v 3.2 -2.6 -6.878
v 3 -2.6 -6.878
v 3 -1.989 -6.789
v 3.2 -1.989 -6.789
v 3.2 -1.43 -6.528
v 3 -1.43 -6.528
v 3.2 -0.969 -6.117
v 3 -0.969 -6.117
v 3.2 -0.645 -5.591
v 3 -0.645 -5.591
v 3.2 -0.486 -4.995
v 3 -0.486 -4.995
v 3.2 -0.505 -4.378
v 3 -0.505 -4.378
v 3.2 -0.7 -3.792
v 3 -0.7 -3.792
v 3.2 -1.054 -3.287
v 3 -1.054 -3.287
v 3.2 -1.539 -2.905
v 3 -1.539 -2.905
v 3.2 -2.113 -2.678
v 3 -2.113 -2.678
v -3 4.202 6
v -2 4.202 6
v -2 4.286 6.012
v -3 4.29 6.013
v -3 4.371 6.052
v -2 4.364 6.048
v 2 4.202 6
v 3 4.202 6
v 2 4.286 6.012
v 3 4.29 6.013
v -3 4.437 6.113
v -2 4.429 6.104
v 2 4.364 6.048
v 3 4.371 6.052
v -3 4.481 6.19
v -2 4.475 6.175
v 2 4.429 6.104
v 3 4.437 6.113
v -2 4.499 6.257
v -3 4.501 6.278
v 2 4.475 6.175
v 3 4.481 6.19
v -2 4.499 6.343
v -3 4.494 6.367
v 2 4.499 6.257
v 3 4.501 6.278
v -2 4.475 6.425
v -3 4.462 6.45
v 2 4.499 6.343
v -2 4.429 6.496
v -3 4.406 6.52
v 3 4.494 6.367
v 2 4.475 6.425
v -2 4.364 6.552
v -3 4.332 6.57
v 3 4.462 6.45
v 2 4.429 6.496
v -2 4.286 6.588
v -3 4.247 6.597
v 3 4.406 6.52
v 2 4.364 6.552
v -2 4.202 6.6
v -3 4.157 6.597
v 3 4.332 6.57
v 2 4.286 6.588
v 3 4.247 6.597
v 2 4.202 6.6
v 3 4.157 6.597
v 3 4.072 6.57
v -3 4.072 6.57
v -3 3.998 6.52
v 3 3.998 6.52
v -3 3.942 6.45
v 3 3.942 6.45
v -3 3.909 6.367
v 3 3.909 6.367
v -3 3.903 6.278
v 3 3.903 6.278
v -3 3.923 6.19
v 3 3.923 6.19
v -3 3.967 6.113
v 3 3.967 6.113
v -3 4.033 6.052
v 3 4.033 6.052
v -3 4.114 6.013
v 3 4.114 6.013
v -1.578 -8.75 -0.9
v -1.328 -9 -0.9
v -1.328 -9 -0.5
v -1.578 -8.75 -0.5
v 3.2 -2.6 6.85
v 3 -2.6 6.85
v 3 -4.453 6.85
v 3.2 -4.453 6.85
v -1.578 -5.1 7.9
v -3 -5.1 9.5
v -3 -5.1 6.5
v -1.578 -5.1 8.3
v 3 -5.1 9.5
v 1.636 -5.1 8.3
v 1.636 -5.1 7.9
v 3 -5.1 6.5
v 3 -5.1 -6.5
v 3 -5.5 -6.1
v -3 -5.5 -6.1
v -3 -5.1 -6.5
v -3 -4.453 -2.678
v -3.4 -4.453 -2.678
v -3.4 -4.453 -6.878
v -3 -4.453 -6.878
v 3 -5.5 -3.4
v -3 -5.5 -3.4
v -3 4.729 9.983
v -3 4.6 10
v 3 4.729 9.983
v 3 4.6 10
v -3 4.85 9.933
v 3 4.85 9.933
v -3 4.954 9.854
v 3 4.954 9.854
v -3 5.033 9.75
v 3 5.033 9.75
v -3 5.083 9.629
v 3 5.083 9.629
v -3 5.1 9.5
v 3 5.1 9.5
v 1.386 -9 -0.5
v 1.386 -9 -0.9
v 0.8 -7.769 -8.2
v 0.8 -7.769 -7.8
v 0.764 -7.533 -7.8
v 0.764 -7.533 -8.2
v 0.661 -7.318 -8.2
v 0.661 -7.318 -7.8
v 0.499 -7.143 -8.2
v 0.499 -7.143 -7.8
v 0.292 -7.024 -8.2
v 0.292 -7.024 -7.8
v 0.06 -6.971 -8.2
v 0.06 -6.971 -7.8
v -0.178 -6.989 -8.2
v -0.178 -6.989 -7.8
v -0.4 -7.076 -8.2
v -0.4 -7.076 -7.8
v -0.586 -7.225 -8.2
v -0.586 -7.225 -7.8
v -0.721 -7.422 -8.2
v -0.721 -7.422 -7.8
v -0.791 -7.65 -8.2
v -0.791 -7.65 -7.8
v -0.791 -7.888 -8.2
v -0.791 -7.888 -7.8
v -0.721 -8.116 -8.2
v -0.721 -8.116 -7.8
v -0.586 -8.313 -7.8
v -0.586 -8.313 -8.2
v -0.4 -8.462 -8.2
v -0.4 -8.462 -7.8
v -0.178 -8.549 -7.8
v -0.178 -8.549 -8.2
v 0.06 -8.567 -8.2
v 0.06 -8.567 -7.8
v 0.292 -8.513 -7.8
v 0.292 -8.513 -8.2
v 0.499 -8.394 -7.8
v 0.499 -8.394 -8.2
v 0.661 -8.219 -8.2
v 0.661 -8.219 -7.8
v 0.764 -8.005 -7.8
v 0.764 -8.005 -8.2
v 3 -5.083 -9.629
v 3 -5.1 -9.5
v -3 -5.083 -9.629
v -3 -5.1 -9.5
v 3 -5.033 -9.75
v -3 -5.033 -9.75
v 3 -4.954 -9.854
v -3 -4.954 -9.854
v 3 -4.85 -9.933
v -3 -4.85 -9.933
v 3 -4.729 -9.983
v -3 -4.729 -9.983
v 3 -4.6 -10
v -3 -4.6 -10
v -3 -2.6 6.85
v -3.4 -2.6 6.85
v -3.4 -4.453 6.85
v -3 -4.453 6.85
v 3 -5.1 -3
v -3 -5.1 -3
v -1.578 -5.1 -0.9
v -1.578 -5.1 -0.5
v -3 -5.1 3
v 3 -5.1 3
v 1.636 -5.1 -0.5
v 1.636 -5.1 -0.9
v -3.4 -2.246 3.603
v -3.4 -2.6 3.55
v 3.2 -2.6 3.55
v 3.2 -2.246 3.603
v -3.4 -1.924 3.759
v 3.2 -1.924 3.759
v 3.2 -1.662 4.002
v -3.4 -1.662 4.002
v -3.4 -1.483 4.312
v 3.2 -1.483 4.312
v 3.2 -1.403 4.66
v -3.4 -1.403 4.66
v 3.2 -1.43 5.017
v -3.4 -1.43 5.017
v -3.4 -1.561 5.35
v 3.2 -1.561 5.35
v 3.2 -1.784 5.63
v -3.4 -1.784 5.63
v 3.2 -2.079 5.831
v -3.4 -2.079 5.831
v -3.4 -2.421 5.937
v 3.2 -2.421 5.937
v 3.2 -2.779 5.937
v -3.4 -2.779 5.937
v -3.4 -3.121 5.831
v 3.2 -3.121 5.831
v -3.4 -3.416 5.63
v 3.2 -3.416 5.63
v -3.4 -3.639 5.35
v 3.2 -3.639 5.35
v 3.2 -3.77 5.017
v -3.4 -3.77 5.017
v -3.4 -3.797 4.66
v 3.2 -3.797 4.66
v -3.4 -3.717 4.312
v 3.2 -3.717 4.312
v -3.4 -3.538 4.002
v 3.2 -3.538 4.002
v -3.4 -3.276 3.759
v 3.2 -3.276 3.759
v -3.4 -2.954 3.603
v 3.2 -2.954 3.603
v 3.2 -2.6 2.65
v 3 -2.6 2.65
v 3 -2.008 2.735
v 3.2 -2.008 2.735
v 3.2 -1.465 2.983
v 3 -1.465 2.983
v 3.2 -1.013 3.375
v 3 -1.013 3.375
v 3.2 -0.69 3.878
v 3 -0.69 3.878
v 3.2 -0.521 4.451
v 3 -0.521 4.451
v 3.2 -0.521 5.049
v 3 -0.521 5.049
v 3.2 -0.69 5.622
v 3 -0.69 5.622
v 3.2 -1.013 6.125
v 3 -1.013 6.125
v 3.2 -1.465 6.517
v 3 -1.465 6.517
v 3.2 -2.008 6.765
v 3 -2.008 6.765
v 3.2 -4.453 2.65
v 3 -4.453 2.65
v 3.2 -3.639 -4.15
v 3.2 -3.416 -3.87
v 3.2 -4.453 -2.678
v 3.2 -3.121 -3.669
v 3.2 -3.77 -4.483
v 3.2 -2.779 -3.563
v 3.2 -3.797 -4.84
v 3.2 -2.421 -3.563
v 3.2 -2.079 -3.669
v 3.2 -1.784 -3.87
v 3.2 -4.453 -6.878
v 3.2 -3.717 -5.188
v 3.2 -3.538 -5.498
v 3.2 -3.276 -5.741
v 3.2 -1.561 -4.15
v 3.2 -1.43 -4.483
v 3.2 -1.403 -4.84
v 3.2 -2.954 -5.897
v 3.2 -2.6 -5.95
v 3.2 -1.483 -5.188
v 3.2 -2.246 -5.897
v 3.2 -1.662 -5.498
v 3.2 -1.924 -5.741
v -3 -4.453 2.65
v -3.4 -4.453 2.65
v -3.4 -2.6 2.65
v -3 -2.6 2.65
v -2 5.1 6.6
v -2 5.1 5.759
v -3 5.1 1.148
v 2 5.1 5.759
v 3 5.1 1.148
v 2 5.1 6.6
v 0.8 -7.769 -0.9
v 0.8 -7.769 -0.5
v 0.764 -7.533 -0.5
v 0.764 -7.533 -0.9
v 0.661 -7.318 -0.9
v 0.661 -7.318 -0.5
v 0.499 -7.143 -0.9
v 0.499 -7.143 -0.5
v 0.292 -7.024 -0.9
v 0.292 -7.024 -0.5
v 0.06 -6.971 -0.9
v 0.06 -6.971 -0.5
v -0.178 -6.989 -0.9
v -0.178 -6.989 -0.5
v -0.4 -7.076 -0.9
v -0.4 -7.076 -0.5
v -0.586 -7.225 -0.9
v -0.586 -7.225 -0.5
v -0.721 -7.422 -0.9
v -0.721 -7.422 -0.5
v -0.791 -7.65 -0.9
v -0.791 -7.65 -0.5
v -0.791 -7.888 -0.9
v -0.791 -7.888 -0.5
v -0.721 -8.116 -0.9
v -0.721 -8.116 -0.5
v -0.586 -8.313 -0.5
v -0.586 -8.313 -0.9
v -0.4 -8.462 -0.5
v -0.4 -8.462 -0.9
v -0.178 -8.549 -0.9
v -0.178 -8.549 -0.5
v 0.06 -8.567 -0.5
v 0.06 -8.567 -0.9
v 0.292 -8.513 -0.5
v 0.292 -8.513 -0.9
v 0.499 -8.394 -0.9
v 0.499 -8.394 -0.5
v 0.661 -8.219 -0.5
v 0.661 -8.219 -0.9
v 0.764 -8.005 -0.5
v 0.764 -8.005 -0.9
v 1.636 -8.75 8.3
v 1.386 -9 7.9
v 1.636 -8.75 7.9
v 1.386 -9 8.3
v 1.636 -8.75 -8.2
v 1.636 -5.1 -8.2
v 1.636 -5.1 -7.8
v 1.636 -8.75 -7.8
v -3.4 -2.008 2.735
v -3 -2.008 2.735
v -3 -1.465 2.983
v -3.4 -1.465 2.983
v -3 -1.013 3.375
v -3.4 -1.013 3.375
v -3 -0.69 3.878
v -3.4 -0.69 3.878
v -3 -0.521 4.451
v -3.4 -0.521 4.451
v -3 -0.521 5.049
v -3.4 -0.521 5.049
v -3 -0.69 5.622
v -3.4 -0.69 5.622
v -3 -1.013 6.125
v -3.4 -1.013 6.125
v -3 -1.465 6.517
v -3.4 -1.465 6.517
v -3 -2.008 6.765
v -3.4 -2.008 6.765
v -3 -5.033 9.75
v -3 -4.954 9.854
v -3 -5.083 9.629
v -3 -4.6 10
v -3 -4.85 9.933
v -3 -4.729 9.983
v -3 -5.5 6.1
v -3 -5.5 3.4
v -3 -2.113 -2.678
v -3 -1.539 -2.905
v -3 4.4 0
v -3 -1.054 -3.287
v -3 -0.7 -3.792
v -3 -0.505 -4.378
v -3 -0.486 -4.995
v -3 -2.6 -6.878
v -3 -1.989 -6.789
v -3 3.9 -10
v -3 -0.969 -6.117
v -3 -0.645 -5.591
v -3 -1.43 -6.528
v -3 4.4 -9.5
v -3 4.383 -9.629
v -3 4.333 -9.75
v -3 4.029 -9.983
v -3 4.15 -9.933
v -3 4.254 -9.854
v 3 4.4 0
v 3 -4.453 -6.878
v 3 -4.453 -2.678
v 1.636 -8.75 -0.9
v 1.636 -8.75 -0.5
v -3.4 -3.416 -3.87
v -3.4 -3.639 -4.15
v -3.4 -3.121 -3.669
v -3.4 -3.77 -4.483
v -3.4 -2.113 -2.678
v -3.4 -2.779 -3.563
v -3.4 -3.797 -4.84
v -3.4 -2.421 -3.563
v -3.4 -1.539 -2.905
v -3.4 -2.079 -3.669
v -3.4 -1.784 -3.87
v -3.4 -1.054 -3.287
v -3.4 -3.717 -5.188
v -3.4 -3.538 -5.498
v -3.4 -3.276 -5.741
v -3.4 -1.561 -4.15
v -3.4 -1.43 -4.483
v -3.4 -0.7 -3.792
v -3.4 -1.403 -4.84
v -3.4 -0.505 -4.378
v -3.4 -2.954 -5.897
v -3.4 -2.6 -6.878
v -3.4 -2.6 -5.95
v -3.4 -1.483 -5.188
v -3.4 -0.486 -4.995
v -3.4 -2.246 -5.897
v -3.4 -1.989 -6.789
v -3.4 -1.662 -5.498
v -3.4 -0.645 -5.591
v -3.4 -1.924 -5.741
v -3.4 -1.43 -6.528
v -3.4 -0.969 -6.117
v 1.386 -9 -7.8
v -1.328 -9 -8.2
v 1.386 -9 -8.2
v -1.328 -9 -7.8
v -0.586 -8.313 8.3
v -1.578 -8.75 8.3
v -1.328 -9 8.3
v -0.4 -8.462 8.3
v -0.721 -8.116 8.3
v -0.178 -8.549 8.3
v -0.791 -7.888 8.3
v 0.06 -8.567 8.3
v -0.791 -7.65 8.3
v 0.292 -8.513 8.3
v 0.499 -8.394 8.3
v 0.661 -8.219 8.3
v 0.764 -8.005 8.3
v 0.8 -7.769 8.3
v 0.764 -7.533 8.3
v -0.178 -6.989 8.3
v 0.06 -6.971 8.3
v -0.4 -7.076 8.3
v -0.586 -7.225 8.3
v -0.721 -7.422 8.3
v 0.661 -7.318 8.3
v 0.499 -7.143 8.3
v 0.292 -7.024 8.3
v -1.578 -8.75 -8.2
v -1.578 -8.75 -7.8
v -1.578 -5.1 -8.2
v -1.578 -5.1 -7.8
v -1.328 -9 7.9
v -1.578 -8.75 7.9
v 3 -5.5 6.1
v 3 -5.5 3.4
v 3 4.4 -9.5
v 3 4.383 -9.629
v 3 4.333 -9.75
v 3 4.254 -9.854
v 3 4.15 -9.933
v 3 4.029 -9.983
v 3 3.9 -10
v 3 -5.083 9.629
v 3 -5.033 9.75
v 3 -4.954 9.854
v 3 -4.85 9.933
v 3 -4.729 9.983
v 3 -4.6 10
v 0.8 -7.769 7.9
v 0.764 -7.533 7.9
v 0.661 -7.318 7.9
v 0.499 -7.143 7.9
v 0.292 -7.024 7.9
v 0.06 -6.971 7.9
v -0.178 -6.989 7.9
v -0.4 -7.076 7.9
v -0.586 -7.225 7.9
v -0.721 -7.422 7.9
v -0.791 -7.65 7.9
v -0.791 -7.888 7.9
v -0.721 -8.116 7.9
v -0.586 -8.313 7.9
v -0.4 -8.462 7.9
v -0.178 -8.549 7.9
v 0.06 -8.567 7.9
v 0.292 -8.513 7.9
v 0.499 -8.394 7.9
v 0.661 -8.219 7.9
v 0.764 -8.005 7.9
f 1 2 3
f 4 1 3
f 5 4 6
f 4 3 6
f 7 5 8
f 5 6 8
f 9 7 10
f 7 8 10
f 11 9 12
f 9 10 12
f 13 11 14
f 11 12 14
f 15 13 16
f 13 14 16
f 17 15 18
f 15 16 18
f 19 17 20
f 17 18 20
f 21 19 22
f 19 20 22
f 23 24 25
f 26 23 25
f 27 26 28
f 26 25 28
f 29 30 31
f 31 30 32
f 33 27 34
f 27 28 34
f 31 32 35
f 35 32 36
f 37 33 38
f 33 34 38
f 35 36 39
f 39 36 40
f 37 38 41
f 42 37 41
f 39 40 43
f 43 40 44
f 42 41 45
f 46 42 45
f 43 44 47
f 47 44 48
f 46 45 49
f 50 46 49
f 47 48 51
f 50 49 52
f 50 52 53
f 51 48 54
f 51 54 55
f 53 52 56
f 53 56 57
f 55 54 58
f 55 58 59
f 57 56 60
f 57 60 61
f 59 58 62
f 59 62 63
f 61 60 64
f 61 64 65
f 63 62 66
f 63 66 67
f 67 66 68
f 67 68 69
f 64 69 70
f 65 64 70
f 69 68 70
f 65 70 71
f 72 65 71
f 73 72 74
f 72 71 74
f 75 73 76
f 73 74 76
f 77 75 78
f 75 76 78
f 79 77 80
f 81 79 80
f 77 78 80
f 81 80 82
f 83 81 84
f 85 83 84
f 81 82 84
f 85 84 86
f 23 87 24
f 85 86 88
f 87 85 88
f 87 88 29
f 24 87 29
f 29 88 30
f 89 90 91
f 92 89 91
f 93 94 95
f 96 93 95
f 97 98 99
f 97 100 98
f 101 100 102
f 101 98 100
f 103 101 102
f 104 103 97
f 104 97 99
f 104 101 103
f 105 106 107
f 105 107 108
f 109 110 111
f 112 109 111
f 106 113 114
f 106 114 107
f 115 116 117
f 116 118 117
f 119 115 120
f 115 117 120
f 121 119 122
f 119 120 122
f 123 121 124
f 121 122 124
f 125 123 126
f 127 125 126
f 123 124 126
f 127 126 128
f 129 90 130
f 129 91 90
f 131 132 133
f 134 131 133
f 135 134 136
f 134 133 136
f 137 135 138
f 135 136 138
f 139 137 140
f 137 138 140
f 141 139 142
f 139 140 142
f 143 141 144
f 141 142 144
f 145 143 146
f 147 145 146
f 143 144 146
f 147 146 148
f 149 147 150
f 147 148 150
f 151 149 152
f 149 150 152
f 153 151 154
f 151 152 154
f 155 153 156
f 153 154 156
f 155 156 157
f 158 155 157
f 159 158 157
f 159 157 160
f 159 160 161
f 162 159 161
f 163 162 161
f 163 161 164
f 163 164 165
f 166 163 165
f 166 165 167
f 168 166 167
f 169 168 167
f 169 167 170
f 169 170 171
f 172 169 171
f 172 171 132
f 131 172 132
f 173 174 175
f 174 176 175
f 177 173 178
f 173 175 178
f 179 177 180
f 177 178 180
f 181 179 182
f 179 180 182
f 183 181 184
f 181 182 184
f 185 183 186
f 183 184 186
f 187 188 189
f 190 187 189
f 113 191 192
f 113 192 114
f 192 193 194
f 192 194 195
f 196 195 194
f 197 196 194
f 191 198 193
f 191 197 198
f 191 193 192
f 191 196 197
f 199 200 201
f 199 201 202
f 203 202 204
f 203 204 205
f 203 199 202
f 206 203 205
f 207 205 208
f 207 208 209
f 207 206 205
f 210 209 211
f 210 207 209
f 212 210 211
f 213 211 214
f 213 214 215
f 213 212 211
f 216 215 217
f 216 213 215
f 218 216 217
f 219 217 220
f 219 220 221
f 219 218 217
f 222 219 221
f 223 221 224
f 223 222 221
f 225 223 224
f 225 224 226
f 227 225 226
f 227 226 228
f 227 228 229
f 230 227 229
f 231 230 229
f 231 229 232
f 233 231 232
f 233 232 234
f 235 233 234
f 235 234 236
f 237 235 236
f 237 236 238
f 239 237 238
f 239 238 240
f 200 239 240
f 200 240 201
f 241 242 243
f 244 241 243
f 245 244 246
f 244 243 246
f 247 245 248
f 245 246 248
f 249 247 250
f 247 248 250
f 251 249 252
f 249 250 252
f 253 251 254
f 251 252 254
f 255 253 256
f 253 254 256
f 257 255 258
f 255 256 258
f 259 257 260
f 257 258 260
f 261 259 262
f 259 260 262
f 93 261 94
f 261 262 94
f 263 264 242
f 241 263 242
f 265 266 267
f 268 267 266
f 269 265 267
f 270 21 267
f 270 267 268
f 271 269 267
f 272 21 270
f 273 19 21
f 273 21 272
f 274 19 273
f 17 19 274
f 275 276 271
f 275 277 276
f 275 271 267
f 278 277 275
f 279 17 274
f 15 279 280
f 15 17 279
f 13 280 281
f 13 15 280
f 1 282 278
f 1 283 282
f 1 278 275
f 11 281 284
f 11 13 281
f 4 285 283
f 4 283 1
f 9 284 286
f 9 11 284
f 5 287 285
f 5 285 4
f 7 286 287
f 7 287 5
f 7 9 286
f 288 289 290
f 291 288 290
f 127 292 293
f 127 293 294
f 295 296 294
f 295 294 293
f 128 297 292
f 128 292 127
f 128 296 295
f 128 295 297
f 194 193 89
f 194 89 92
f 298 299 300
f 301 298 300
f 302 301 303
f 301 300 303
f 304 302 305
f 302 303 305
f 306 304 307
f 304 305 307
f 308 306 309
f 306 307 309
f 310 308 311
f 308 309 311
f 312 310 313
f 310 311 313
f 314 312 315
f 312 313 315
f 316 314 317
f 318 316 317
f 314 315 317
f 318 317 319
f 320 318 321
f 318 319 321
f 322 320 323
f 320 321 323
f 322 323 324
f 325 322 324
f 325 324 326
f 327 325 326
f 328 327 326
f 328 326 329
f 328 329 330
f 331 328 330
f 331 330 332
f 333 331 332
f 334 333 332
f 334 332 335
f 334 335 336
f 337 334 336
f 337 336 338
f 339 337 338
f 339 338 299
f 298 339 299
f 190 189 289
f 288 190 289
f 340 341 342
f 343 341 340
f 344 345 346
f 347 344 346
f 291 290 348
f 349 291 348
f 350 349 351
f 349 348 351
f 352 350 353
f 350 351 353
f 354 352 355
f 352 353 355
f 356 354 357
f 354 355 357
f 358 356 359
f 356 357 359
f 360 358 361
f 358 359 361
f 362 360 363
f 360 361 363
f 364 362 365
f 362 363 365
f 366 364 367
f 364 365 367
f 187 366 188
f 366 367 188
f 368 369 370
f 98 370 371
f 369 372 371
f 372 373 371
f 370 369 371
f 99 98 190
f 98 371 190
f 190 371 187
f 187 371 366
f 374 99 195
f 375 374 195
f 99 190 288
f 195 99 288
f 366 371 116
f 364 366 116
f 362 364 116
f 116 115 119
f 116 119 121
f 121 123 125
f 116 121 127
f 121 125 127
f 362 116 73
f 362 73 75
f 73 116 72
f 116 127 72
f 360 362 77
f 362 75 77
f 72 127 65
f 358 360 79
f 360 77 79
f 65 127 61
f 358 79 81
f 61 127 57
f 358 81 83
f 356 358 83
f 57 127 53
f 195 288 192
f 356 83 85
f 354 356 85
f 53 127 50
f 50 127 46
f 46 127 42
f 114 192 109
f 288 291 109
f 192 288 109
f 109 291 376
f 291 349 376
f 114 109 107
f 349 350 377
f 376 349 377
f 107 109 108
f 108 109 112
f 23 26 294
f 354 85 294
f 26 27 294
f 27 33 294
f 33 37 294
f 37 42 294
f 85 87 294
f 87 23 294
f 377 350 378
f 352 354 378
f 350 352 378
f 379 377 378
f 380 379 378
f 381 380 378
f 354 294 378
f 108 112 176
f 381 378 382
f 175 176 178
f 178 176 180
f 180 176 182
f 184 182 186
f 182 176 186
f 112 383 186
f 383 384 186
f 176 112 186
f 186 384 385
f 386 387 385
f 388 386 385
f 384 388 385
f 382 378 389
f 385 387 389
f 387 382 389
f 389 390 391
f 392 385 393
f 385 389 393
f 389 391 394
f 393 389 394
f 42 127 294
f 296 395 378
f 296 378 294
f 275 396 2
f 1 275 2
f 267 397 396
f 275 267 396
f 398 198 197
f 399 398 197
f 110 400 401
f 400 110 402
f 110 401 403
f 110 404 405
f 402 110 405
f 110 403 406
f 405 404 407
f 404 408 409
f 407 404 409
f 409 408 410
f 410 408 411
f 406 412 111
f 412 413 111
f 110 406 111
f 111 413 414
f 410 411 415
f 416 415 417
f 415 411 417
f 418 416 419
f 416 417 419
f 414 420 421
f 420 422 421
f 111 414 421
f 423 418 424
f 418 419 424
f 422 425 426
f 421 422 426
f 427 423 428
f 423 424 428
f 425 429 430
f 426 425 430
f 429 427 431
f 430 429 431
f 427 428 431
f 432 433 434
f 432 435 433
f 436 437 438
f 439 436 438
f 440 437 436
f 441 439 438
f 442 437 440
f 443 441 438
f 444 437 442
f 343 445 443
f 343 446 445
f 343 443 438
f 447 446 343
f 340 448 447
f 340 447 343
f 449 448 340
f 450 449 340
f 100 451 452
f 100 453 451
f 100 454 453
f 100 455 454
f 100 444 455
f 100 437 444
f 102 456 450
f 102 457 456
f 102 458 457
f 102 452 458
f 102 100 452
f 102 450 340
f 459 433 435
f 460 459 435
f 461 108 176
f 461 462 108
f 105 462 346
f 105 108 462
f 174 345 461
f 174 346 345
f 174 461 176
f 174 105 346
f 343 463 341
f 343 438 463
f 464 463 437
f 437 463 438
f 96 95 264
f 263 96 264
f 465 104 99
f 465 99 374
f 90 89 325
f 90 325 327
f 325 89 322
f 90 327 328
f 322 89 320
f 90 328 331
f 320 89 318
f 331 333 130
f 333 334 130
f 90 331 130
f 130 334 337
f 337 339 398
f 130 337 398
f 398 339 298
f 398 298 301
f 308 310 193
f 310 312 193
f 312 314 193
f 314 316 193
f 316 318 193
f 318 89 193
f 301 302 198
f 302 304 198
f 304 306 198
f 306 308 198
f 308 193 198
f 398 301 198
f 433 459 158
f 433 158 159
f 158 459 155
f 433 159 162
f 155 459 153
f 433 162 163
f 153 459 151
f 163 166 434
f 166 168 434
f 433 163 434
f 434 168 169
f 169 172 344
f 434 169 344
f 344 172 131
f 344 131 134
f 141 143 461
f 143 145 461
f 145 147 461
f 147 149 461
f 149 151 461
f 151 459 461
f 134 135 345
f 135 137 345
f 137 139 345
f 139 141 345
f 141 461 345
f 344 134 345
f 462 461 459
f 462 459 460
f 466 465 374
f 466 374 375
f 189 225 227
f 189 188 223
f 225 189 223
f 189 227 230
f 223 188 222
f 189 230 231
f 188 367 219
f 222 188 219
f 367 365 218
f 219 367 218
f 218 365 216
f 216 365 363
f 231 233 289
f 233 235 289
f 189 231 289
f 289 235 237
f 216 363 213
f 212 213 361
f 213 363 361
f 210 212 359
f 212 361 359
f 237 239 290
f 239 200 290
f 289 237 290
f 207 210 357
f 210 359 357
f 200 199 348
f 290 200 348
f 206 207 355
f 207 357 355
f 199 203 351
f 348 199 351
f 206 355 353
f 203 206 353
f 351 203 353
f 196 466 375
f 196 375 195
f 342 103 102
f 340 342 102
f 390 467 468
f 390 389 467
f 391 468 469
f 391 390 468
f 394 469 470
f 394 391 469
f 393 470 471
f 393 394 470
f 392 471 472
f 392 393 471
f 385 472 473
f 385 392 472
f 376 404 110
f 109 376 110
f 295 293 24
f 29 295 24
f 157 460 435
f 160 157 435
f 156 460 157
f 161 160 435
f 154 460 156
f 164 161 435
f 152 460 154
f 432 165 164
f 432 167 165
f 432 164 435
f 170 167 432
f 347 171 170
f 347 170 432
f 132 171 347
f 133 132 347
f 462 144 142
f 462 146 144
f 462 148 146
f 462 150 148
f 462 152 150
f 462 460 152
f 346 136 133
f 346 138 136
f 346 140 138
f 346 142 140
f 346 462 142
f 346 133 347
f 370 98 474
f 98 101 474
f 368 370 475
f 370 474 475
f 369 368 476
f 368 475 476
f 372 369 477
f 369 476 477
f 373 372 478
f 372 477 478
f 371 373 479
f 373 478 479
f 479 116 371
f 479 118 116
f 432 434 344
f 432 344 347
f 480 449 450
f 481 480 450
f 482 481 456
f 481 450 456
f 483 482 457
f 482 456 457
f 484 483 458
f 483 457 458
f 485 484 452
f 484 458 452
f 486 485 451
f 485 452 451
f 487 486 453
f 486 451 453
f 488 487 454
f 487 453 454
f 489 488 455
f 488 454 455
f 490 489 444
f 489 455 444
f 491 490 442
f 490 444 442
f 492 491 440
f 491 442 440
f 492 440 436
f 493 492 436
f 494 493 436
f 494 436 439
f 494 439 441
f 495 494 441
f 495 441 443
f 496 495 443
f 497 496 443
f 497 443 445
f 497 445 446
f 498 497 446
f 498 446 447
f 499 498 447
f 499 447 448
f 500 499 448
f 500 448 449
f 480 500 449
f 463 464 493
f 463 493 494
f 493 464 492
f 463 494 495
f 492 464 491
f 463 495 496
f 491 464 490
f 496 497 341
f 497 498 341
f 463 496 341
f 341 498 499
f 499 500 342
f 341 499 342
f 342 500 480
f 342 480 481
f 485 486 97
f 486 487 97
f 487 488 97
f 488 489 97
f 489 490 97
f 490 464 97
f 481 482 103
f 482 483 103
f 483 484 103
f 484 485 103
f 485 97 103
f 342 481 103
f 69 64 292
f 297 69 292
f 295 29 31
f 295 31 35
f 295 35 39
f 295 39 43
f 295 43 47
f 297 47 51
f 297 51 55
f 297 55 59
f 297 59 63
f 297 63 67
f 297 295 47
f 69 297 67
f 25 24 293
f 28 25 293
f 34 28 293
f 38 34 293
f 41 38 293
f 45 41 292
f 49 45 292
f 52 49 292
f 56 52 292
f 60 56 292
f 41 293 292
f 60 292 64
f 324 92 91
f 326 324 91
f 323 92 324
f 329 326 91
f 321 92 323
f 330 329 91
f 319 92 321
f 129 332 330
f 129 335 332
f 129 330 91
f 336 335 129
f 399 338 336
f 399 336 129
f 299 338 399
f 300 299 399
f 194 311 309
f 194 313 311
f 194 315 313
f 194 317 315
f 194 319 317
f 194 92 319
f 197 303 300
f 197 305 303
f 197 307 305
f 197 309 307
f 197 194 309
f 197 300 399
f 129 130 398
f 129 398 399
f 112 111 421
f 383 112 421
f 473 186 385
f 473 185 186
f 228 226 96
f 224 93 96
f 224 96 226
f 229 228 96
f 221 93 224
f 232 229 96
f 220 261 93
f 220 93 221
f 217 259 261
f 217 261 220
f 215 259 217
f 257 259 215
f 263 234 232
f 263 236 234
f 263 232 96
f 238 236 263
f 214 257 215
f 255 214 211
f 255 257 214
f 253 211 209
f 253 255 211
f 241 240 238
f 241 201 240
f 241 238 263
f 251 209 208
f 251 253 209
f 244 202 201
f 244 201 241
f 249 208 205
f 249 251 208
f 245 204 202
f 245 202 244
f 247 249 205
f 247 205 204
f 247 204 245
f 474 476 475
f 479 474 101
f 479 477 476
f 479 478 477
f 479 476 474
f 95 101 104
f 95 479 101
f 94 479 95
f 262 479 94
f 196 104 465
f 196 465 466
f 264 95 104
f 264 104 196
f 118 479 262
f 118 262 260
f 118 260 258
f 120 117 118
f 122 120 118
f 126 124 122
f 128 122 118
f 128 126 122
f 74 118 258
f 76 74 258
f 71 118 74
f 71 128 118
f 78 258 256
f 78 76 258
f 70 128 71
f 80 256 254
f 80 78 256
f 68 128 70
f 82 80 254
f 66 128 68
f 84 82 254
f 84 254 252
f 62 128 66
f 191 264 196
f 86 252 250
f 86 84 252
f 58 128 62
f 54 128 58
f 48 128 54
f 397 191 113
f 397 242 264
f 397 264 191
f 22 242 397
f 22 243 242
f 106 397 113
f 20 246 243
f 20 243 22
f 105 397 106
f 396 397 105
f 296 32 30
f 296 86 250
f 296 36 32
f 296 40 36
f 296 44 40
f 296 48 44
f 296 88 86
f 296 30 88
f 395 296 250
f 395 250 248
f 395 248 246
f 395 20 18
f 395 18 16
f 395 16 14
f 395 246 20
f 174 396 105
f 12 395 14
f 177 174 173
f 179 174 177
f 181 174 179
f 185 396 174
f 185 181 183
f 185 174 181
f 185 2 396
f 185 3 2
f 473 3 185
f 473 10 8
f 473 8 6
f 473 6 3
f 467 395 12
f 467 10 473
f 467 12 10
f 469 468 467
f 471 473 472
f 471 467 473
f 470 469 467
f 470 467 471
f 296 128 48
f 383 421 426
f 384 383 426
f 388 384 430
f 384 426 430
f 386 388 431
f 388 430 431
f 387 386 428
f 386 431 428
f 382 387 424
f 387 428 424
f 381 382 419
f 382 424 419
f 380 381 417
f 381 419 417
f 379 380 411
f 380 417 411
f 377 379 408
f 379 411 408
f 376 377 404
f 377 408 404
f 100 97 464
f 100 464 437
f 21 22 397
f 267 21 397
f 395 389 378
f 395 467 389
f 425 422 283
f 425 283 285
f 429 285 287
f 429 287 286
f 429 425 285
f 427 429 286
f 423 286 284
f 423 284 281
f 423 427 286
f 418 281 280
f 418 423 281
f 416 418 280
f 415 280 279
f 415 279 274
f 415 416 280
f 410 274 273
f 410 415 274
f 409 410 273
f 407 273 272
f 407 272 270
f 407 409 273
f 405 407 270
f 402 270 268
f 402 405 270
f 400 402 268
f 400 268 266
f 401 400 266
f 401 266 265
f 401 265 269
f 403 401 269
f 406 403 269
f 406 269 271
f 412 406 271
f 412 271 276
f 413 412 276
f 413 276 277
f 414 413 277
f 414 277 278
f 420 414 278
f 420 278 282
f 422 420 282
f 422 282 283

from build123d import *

# Parameters (mm, degrees)
BOSS_EXTRUDE1_DEPTH      = 3
SKETCH5_W                = 3.213765407
SKETCH5_H                = 0.4
BOSS_EXTRUDE2_DEPTH      = 3.9
CHAMFER2_SIZE            = 0.25
SKETCH6_R                = 0.8
CUT_EXTRUDE1_DEPTH       = 21.612860064
FILLET1_R                = 0.5
SKETCH7_R                = 1.2
CUT_EXTRUDE2_DEPTH       = 15.730919863
BOSS_EXTRUDE5_DEPTH      = 3.2
BOSS_EXTRUDE5_DEPTH_BACK = 3.4
SKETCH11_R               = 1.2
SKETCH12_R               = 0.3
CUT_EXTRUDE3_DEPTH       = 15.898322053
CUT_EXTRUDE4_DEPTH       = 2
CUT_EXTRUDE4_DEPTH_BACK  = 2


with BuildPart() as part:
    # Sketch1 → Boss-Extrude1 (new, symmetric)
    with BuildSketch(Plane(origin=(0, 0, 0), x_dir=(0, 0, -1), z_dir=(1, 0, 0))):
        Polygon((10, 4.4), (0, 4.4), (-1.147622848, 5.1), (-10, 5.1), (-10, -5.1), (-6.5, -5.1), (-6.1, -5.5), (-3.4, -5.5), (-3, -5.1), (3, -5.1), (3.4, -5.5), (6.1, -5.5), (6.5, -5.1), (10, -5.1), align=None)
    extrude(amount=BOSS_EXTRUDE1_DEPTH, both=True)

    # Sketch5 → Boss-Extrude2 (add)
    with BuildSketch(Plane.XZ.offset(5.1)):
        with Locations((0.02921605, 8.1)):
            Rectangle(SKETCH5_W, SKETCH5_H)
        with Locations((0.02921605, -0.7)):
            Rectangle(SKETCH5_W, SKETCH5_H)
        with Locations((0.02921605, -8)):
            Rectangle(SKETCH5_W, SKETCH5_H)
    extrude(amount=BOSS_EXTRUDE2_DEPTH)

    # Chamfer2
    chamfer2_edges = [part.edges().sort_by_distance(p)[0] for p in [
        (-1.577666654, -9, 8.1),
        (1.636098753, -9, 8.1),
        (-1.577666654, -9, -0.7),
        (1.636098753, -9, -0.7),
        (-1.577666654, -9, -8),
        (1.636098753, -9, -8),
    ]]
    chamfer(chamfer2_edges, length=CHAMFER2_SIZE)

    # Sketch6 → Cut-Extrude1 (cut, through all)
    with BuildSketch(Plane.XY.offset(8.3)):
        with Locations((0, -7.76874139)):
            Circle(SKETCH6_R)
    extrude(amount=-CUT_EXTRUDE1_DEPTH, mode=Mode.SUBTRACT)

    # Fillet1
    fillet1_edges = [part.edges().sort_by_distance(p)[0] for p in [
        (0, -5.1, 10),
        (0, 5.1, 10),
        (0, 4.4, -10),
        (0, -5.1, -10),
    ]]
    fillet(fillet1_edges, radius=FILLET1_R)

    # Sketch7 → Cut-Extrude2 (cut, through all)
    with BuildSketch(Plane(origin=(3, 0, 0), x_dir=(0, 0, -1), z_dir=(1, 0, 0))):
        with Locations((-4.75, -2.6)):
            Circle(SKETCH7_R)
        with Locations((4.75, -2.6)):
            Circle(SKETCH7_R)
    extrude(amount=-CUT_EXTRUDE2_DEPTH, mode=Mode.SUBTRACT)

    # Sketch11 → Boss-Extrude5 (add, two sides: drawn at the far end of the back side and taken through both)
    # profile 1 of 2: a face of its own
    with BuildSketch(Plane(origin=(0, 0, 0), x_dir=(0, 0, -1), z_dir=(1, 0, 0)).offset(-BOSS_EXTRUDE5_DEPTH_BACK)):
        with BuildLine():
            Line((-6.85, -4.453368072), (-2.65, -4.453368072))
            Line((-2.65, -4.453368072), (-2.65, -2.6))
            ThreePointArc((-2.65, -2.6), (-4.75, -0.5), (-6.85, -2.6))
            Line((-6.85, -2.6), (-6.85, -4.453368072))
        make_face()
        with Locations((-4.75, -2.6)):
            Circle(SKETCH11_R, mode=Mode.SUBTRACT)
    # profile 2 of 2: a face of its own
    with BuildSketch(Plane(origin=(0, 0, 0), x_dir=(0, 0, -1), z_dir=(1, 0, 0)).offset(-BOSS_EXTRUDE5_DEPTH_BACK)):
        with BuildLine():
            Line((2.678191921, -4.453368072), (6.878191921, -4.453368072))
            Line((6.878191921, -4.453368072), (6.878191921, -2.6))
            ThreePointArc((6.878191921, -2.6), (4.994944522, -0.485951033), (2.678191921, -2.113366526))
            Line((2.678191921, -2.113366526), (2.678191921, -4.453368072))
        make_face()
        with Locations((4.75, -2.6)):
            Circle(SKETCH11_R, mode=Mode.SUBTRACT)
    extrude(amount=BOSS_EXTRUDE5_DEPTH + BOSS_EXTRUDE5_DEPTH_BACK)

    # Sketch12 → Cut-Extrude3 (cut, through all)
    with BuildSketch(Plane(origin=(3, 0, 0), x_dir=(0, 0, -1), z_dir=(1, 0, 0))):
        with Locations((-6.3, 4.201970351)):
            Circle(SKETCH12_R)
    extrude(amount=-CUT_EXTRUDE3_DEPTH, mode=Mode.SUBTRACT)

    # Sketch13 → Cut-Extrude4 (cut, two sides: drawn at the far end of the back side and taken through both)
    with BuildSketch(Plane(origin=(0, 0, 0), x_dir=(0, 0, -1), z_dir=(1, 0, 0)).offset(-CUT_EXTRUDE4_DEPTH_BACK)):
        Polygon((-6.6, 4.201970351), (-6.6, 5.1), (-5.759373681, 5.1), (-6, 4.201970351), align=None)
    extrude(amount=CUT_EXTRUDE4_DEPTH + CUT_EXTRUDE4_DEPTH_BACK, mode=Mode.SUBTRACT)


solid = part.part
